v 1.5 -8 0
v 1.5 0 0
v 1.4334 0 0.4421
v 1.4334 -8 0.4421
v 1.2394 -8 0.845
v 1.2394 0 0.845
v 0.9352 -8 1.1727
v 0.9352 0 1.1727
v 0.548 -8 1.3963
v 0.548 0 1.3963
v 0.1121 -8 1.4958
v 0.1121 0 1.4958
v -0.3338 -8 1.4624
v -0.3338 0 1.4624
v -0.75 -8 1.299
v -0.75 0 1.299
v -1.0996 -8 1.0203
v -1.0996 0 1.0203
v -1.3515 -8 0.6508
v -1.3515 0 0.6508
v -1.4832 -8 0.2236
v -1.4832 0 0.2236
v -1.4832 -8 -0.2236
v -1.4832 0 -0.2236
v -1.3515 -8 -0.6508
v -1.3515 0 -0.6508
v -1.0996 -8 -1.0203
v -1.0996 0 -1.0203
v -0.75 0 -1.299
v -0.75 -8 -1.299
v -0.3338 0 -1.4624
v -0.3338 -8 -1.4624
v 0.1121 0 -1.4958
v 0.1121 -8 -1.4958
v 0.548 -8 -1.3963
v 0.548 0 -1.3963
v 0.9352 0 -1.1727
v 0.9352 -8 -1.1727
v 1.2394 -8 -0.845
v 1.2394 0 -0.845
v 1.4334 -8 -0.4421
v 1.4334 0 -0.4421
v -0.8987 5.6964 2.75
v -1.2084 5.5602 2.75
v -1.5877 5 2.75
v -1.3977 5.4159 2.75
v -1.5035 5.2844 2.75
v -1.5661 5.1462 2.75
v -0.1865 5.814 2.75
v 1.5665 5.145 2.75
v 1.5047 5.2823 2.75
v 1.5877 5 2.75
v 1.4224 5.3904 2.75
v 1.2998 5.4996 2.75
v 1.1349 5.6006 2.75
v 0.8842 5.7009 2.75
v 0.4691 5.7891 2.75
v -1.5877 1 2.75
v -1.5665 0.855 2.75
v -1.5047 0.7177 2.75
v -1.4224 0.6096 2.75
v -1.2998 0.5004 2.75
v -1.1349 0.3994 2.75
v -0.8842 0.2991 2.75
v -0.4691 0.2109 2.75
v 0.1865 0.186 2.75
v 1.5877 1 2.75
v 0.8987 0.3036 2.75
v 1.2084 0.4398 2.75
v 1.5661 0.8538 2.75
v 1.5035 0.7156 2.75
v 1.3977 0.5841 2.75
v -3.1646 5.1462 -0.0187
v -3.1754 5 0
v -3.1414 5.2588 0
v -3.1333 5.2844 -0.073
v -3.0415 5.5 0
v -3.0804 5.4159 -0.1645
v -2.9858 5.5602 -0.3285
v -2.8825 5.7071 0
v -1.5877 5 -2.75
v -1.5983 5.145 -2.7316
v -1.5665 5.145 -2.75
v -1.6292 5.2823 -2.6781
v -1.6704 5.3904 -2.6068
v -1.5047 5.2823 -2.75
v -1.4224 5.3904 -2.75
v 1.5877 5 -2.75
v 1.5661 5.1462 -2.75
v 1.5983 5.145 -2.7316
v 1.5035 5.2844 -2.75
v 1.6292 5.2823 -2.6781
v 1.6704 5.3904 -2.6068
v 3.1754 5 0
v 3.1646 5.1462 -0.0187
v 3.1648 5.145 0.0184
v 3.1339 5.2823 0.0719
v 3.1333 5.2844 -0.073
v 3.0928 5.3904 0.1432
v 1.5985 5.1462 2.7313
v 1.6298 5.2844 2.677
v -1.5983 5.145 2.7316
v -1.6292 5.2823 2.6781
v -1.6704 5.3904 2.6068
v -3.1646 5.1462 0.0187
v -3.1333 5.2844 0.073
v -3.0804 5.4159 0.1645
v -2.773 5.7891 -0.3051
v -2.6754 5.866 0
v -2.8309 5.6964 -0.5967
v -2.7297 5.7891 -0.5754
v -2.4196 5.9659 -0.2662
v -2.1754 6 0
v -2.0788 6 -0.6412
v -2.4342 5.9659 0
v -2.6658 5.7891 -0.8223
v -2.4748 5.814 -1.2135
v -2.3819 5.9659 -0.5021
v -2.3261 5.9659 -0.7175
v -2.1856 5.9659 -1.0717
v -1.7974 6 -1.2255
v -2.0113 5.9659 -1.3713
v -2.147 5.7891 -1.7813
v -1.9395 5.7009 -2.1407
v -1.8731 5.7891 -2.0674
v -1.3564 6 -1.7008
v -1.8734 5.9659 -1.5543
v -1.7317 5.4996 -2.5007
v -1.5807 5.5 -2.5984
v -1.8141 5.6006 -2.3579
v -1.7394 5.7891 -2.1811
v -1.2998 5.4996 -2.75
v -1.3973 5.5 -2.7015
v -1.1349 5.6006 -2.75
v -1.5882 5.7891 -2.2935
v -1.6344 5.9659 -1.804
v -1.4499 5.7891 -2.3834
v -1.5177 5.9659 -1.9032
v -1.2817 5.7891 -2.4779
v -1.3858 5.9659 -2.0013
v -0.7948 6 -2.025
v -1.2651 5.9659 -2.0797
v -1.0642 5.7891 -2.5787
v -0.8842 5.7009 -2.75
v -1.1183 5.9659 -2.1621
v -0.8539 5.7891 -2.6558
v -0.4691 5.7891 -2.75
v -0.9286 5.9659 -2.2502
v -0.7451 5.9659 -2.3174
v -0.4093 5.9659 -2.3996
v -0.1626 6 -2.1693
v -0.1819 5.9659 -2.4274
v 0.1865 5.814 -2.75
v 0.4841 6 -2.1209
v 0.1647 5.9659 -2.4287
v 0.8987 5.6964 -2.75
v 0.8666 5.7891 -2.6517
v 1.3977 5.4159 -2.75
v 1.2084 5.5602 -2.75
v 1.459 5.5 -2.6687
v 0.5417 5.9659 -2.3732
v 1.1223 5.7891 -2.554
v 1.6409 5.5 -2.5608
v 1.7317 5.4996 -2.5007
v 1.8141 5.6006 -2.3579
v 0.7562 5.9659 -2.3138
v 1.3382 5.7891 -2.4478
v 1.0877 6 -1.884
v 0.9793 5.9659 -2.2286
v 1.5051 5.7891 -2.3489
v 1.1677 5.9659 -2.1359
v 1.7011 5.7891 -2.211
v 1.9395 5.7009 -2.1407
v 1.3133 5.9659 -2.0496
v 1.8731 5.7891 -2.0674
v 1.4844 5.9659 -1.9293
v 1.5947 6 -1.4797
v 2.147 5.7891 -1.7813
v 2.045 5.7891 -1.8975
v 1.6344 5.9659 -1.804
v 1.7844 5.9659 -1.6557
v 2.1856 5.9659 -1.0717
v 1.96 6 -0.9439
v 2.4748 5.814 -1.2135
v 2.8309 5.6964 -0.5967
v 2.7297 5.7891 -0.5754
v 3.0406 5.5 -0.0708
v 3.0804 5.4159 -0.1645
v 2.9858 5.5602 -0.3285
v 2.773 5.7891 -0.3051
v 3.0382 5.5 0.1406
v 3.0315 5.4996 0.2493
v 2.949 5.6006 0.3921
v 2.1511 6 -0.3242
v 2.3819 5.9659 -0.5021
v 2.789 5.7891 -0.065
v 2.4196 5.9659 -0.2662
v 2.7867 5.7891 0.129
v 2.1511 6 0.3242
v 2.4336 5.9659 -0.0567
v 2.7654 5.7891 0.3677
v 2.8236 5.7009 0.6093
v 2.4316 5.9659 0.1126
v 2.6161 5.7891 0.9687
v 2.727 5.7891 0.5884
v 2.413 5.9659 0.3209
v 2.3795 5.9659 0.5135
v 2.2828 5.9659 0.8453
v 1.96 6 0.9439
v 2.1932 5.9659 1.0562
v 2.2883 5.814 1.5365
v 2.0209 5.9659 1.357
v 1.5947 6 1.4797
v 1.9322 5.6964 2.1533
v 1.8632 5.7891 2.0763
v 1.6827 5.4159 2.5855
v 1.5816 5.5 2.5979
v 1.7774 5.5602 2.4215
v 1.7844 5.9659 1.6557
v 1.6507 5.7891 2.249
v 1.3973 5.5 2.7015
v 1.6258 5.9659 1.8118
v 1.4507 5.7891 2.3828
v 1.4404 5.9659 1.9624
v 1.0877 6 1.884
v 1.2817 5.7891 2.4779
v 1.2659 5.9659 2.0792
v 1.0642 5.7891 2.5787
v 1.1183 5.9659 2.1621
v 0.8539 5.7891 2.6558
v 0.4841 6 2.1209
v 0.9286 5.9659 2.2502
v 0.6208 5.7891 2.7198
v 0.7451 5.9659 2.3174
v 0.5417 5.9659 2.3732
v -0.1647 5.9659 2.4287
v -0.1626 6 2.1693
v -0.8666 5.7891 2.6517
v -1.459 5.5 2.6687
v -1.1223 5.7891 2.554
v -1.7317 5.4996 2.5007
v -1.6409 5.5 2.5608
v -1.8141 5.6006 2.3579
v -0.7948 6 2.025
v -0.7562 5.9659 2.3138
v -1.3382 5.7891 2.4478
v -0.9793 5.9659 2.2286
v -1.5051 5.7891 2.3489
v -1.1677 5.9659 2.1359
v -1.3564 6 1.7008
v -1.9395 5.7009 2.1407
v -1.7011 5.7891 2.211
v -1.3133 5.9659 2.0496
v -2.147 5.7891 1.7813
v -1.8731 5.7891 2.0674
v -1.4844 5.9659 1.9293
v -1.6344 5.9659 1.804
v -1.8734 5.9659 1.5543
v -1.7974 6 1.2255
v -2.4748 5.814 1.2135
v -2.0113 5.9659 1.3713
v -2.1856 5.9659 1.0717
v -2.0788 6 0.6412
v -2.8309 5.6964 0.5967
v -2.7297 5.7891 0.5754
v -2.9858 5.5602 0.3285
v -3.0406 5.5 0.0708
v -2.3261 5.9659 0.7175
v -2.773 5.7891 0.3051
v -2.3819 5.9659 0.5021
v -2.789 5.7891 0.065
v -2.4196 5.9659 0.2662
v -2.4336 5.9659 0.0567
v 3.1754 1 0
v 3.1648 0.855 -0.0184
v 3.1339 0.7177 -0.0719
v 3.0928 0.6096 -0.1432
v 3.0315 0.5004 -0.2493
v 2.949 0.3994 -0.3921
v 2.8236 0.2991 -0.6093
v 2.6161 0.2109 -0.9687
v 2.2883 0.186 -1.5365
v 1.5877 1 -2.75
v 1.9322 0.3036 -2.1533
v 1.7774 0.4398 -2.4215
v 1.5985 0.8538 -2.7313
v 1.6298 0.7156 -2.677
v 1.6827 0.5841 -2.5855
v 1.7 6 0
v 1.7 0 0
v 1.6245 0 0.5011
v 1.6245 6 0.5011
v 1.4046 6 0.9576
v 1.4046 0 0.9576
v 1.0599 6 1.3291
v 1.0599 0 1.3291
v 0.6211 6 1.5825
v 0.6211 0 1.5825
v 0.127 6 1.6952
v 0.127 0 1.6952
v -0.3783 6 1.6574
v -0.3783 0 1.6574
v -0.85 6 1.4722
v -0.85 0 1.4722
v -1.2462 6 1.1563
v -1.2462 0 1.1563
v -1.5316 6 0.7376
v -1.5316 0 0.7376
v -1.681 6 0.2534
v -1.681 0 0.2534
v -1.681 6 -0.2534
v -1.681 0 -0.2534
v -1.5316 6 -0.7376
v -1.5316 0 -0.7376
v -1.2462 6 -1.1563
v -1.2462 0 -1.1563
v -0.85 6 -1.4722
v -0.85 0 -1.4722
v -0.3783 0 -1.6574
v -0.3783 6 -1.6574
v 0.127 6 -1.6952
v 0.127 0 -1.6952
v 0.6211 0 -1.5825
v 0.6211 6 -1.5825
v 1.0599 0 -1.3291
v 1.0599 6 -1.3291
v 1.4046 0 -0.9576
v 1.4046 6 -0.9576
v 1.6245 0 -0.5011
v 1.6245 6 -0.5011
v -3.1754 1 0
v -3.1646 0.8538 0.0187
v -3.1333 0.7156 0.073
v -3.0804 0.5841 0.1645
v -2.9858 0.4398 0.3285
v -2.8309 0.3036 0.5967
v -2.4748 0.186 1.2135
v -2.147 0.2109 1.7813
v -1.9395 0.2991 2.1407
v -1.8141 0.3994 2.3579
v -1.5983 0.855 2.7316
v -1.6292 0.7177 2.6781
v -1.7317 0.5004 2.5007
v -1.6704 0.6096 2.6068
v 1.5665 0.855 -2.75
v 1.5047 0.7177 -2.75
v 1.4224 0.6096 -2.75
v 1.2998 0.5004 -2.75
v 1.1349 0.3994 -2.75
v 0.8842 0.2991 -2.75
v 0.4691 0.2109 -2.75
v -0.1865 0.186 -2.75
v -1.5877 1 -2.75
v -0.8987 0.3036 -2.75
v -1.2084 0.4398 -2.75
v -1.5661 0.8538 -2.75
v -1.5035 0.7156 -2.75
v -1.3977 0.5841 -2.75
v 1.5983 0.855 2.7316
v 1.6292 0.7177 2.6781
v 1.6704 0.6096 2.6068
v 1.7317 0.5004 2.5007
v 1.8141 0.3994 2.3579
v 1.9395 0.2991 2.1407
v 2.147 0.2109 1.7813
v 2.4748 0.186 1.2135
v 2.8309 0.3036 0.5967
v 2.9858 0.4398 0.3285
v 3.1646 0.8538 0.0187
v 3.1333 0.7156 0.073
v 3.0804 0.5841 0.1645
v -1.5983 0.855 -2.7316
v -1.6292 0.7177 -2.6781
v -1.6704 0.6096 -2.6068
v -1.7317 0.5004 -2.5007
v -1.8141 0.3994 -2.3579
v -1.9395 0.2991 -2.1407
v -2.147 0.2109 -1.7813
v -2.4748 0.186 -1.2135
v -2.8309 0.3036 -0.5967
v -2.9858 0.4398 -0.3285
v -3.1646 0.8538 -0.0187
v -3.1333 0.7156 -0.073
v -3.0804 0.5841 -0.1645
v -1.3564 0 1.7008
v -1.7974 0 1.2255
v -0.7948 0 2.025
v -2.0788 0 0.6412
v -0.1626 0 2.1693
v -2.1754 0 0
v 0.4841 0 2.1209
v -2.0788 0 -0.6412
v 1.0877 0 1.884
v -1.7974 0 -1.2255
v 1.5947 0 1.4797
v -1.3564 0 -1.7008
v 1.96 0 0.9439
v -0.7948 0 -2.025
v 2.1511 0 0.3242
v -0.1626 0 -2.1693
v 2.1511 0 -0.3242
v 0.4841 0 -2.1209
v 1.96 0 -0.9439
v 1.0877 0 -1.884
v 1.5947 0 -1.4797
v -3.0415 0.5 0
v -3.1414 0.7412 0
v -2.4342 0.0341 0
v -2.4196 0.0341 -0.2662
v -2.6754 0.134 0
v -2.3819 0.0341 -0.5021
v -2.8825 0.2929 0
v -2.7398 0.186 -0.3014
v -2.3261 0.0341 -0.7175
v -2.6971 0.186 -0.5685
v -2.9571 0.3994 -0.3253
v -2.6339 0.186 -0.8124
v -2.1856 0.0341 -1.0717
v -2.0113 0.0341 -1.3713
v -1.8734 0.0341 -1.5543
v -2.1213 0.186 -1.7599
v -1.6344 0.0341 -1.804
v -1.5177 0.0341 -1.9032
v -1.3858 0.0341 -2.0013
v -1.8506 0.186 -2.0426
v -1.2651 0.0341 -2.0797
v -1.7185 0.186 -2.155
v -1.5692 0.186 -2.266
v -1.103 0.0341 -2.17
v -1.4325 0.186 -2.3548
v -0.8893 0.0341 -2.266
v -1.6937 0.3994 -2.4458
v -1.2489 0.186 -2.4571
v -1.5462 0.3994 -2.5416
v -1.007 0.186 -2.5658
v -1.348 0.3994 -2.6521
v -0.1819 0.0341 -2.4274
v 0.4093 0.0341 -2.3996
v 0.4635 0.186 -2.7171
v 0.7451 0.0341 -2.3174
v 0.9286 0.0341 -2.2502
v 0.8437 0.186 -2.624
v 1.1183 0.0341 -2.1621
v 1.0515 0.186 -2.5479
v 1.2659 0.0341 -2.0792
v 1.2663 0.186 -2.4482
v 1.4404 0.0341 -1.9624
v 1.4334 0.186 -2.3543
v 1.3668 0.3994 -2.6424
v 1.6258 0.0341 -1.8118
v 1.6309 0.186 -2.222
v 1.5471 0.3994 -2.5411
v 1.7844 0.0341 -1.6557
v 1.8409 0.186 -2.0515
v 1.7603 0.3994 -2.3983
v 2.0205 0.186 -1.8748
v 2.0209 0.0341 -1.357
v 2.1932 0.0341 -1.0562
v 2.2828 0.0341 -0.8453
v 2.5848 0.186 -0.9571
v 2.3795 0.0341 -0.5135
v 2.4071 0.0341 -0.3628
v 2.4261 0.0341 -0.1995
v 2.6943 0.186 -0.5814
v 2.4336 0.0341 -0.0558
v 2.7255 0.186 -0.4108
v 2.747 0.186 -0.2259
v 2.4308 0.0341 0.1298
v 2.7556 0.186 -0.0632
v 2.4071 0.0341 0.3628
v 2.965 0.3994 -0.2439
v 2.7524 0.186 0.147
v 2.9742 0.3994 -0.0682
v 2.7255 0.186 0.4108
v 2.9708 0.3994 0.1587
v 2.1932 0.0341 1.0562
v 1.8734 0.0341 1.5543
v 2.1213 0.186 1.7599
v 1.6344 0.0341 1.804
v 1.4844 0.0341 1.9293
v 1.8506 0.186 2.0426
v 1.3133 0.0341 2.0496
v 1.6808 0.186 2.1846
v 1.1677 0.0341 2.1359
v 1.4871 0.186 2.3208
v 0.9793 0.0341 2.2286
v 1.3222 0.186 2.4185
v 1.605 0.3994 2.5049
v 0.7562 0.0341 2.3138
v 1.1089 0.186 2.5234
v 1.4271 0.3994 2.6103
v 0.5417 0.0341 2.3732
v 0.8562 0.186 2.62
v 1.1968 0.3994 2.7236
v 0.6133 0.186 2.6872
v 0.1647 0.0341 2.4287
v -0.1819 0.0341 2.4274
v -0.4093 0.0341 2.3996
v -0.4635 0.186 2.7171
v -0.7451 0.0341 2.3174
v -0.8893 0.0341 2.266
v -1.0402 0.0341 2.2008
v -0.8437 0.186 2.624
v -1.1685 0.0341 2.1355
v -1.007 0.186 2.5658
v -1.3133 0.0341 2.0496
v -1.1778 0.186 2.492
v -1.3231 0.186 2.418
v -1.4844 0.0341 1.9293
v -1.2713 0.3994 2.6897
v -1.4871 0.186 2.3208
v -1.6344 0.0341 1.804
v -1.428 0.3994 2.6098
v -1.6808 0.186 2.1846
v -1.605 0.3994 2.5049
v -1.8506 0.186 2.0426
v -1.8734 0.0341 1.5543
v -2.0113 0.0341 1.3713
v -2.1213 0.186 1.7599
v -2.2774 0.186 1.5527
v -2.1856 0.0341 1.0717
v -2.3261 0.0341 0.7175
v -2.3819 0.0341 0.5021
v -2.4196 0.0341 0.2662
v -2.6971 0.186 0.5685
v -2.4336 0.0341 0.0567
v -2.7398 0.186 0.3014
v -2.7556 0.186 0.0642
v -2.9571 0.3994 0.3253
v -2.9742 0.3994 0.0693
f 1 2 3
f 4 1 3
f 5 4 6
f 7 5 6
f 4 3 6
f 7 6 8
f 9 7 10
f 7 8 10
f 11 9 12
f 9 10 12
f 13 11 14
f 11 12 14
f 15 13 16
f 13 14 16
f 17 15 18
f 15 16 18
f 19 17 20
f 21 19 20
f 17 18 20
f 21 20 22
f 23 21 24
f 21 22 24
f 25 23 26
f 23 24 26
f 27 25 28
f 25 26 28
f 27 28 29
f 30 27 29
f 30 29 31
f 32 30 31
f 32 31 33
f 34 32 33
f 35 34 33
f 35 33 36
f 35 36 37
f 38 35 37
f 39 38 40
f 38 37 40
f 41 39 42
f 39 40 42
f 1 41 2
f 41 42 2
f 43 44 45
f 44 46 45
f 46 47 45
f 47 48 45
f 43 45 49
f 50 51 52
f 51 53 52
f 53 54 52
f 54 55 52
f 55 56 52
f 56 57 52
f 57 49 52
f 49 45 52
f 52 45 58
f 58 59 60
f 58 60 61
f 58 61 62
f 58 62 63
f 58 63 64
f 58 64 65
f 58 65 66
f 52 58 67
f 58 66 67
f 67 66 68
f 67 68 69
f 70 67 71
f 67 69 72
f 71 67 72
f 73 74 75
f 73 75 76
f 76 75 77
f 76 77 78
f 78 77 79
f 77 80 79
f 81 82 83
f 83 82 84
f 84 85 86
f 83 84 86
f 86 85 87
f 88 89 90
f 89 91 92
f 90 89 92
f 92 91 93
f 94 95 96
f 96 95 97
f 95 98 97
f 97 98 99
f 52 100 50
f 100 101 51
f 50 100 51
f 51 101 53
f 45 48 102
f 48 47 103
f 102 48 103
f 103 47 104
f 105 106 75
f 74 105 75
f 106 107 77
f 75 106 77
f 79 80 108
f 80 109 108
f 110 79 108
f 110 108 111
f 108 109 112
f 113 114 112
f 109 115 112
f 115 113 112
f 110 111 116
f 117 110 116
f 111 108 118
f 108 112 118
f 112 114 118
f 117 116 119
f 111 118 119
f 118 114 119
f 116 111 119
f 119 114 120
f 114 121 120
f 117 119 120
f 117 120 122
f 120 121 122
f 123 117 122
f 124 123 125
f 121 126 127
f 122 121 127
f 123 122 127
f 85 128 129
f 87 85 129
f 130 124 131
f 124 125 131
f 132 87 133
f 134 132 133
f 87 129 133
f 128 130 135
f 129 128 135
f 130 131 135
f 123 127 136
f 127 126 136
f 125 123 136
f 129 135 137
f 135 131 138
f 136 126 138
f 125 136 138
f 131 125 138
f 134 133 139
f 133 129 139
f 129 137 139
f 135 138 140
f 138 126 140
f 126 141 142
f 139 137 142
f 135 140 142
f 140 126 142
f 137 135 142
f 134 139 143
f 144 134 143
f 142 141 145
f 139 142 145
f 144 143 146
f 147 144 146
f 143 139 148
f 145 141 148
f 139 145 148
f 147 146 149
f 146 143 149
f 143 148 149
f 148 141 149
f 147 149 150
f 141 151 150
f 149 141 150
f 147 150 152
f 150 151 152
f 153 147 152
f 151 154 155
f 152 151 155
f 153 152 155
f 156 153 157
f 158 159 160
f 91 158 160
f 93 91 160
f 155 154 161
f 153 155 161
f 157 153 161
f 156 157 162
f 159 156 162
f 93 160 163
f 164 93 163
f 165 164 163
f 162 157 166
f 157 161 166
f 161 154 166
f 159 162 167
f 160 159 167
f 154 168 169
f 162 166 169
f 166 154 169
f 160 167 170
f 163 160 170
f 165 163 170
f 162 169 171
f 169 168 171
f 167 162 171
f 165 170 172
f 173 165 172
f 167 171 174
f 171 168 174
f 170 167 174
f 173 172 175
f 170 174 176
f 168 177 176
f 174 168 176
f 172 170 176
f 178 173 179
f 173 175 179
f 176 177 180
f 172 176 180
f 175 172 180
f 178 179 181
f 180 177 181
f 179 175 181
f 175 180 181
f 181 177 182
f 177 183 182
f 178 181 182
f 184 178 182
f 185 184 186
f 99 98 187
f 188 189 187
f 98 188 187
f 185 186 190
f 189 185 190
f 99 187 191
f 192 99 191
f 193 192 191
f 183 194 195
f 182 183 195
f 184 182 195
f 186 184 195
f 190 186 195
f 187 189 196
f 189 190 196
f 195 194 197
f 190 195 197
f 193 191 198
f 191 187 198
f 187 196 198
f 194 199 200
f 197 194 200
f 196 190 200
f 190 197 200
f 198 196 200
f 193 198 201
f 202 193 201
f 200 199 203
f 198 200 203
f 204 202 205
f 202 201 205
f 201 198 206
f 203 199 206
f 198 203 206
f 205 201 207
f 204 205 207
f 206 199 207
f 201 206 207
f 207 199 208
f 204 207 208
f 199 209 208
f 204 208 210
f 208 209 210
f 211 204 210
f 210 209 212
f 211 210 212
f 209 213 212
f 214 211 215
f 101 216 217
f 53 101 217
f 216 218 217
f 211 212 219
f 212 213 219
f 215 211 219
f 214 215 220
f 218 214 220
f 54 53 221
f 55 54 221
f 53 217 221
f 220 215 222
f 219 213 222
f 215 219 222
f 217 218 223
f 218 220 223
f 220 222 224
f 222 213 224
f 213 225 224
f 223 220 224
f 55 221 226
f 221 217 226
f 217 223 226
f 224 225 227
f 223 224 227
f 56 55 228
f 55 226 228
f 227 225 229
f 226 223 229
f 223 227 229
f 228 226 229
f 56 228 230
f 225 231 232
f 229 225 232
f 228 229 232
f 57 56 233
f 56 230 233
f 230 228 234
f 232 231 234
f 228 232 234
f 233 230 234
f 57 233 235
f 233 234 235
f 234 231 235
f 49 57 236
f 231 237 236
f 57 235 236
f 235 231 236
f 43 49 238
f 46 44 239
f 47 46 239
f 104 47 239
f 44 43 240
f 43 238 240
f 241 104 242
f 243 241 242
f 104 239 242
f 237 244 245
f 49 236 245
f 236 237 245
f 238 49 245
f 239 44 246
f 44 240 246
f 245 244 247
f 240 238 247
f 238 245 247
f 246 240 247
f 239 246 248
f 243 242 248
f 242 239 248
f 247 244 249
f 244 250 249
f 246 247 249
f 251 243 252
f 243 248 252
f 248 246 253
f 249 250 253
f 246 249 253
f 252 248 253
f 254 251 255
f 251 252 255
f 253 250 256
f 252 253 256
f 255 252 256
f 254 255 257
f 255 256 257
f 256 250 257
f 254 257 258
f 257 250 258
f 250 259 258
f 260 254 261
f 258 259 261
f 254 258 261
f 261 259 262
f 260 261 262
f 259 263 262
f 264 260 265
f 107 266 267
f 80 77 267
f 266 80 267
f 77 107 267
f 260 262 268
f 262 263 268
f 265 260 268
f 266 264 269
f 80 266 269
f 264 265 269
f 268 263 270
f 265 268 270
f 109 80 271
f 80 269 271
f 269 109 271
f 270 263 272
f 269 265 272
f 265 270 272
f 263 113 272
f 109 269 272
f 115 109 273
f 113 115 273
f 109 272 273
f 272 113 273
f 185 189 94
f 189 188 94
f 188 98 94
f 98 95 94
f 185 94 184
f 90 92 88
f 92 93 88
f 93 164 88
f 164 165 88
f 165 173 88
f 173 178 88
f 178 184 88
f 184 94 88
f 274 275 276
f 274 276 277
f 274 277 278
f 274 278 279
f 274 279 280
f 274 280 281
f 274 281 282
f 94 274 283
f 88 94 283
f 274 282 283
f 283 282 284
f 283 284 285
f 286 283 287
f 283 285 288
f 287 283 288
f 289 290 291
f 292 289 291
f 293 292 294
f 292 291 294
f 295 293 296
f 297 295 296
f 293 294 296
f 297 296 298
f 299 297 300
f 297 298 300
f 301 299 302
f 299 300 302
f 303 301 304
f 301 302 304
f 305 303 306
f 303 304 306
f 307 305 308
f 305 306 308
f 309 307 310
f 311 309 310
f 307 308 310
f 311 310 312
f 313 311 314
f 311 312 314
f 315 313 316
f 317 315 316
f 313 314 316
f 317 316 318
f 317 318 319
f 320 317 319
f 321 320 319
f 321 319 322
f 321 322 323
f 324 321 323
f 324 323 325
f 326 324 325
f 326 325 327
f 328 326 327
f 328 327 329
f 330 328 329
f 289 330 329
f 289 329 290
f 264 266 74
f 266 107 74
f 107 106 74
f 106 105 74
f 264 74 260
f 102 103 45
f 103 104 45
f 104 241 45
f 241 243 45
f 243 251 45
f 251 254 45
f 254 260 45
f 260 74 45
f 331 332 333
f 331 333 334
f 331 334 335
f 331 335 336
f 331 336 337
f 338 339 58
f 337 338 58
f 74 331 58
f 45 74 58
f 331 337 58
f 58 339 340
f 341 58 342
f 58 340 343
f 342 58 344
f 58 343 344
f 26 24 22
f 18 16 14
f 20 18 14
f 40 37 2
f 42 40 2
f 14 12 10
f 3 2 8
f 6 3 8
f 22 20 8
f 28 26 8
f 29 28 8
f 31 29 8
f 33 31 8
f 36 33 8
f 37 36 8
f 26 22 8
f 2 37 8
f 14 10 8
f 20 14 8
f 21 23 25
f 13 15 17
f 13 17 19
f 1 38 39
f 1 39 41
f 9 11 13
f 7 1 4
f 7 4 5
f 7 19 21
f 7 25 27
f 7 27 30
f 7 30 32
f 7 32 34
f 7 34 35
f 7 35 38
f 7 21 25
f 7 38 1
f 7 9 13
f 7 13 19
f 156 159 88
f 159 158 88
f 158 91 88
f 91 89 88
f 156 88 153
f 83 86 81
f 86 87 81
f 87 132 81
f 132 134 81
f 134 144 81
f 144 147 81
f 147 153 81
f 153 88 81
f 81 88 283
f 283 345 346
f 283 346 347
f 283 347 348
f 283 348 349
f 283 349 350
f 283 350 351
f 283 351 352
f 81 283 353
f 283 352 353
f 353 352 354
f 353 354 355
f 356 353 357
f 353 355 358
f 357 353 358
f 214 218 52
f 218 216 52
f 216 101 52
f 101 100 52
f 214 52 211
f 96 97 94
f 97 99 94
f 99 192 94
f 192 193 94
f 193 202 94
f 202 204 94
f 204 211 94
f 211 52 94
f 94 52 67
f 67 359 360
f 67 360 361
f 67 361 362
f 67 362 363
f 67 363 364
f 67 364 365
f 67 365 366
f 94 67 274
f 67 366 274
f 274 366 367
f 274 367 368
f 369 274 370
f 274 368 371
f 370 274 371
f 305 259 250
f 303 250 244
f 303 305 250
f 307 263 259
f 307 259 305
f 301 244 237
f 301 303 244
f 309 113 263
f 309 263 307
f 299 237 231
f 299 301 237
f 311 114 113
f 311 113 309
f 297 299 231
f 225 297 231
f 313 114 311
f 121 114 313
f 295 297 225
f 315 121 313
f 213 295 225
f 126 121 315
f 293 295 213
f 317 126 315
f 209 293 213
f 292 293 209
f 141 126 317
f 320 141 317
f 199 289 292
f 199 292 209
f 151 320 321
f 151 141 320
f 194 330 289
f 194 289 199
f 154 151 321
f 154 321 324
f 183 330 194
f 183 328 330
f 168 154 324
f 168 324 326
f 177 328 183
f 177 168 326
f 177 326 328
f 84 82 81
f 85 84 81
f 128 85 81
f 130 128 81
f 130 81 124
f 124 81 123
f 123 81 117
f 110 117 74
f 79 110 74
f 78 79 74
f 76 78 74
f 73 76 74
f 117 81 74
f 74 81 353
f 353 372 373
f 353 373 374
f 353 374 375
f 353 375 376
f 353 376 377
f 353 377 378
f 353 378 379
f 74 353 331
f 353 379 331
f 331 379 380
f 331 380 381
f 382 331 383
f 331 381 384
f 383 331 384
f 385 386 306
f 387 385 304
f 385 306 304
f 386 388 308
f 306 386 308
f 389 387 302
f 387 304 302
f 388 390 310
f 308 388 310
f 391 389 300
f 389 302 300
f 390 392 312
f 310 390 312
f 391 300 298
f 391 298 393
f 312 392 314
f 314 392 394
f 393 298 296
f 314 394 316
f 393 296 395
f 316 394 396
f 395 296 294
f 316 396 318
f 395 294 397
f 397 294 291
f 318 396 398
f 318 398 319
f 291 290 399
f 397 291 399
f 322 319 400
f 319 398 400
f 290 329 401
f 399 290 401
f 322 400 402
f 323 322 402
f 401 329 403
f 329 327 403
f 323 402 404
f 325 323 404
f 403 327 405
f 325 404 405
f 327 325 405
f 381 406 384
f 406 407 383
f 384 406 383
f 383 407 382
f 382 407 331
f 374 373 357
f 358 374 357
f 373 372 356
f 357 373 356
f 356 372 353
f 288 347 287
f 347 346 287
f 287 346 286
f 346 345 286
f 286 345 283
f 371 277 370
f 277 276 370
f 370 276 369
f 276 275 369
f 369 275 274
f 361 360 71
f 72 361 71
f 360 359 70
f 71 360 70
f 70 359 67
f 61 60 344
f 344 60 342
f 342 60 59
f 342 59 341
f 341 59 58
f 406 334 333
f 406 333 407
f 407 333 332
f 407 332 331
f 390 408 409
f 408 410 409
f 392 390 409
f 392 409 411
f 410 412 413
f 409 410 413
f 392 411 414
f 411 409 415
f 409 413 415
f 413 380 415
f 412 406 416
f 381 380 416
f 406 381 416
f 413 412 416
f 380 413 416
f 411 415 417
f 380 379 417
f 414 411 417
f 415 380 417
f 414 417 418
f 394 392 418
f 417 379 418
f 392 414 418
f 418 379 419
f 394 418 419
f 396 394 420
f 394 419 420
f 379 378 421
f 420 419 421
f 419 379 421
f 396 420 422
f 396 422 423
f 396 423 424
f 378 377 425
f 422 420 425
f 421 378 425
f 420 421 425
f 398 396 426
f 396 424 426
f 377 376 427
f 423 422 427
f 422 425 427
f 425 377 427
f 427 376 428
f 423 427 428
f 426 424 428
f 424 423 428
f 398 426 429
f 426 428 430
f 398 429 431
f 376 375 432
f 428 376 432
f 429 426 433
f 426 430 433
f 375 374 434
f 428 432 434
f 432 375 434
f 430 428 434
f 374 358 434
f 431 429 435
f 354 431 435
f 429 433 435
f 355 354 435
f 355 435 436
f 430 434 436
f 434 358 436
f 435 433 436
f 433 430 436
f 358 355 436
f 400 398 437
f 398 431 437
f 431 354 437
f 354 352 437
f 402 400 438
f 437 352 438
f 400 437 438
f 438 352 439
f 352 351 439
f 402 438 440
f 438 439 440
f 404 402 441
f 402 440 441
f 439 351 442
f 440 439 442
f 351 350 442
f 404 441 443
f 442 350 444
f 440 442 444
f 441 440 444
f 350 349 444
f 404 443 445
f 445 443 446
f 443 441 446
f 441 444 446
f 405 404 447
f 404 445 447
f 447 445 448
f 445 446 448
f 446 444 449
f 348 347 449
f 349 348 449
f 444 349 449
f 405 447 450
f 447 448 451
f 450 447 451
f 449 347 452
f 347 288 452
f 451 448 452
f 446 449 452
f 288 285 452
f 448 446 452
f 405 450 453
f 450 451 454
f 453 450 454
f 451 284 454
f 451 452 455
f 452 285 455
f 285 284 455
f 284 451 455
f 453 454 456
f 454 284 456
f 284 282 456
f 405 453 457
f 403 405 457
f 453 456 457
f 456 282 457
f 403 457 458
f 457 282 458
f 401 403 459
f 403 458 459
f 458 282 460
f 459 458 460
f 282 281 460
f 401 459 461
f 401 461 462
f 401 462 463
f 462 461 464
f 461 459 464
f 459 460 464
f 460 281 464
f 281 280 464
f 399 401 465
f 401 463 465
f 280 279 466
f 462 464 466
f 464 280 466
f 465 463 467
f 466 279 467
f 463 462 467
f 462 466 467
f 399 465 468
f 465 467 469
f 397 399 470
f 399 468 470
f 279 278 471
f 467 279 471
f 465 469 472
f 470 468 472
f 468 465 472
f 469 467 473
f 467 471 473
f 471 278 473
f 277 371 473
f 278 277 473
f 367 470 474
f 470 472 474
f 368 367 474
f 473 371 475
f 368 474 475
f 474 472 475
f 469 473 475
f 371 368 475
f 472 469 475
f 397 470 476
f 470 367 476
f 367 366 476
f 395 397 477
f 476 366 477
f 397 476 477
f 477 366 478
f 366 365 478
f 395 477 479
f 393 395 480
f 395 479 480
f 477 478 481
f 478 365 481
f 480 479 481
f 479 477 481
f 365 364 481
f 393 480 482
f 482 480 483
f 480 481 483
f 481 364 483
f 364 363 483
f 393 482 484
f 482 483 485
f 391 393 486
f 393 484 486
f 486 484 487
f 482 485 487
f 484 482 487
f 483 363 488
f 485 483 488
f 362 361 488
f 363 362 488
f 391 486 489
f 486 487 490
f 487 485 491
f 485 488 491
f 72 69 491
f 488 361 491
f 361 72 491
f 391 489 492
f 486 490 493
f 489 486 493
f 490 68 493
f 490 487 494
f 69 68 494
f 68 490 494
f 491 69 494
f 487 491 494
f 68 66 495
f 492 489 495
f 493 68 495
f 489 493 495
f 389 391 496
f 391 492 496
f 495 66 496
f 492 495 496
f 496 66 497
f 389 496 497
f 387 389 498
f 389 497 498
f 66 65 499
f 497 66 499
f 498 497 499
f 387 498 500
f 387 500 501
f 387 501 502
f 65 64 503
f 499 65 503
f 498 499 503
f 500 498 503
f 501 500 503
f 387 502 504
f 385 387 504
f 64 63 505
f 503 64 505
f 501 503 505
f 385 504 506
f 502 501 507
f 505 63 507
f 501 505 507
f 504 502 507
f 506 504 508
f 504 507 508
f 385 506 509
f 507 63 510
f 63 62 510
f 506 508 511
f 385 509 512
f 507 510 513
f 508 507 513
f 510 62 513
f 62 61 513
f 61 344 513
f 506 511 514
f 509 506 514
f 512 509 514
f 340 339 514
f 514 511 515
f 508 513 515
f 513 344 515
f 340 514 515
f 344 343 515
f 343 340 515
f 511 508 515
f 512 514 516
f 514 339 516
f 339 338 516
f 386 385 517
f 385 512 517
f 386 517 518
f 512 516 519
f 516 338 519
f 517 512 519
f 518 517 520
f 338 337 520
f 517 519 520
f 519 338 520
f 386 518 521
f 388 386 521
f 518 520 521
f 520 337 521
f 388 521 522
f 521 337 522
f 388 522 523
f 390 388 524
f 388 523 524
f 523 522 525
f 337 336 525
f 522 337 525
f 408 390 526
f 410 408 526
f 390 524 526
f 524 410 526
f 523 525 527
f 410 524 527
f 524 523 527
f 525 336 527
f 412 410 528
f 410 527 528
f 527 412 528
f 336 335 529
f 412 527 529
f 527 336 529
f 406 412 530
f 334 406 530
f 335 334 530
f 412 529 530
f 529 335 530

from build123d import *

# Parameters (mm, degrees)
BOSS_EXTRUDE1_DEPTH      = 6
M3_CLEARANCE_HOLE1_D     = 3.4
M3_CLEARANCE_HOLE1_DEPTH = 12
M3_CLEARANCE_HOLE1_TIP   = 1.021463052
SKETCH5_R                = 1.5
BOSS_EXTRUDE2_DEPTH      = 8


with BuildPart() as part:
    # Sketch1 → Boss-Extrude1 (new body)
    with BuildSketch(Plane(origin=(0, 0, 0), x_dir=(1, 0, 0), z_dir=(0, 1, 0))):
        Polygon((3.175426481, 0), (1.58771324, 2.75), (-1.58771324, 2.75), (-3.175426481, 0), (-1.58771324, -2.75), (1.58771324, -2.75), align=None)
    extrude(amount=BOSS_EXTRUDE1_DEPTH)

    # M3 Clearance Hole1
    with Locations(Plane(origin=(0, 6, 0), x_dir=(-1, 0, 0), z_dir=(0, 1, 0))):
        with Locations((0, 0)):
            Hole(M3_CLEARANCE_HOLE1_D / 2, depth=M3_CLEARANCE_HOLE1_DEPTH)
            with Locations((0, 0, -(M3_CLEARANCE_HOLE1_DEPTH + M3_CLEARANCE_HOLE1_TIP / 2))):  # 118° drill point
                Cone(0, M3_CLEARANCE_HOLE1_D / 2, M3_CLEARANCE_HOLE1_TIP, mode=Mode.SUBTRACT)

    # Sketch4 → Cut-Revolve1 (revolve, cut)
    with BuildSketch(Plane.XY):
        with BuildLine():
            Line((-2.175426481, 6), (-3.175426481, 6))
            Line((-3.175426481, 6), (-3.175426481, 5))
            ThreePointArc((-3.175426481, 5), (-2.882533262, 5.707106781), (-2.175426481, 6))
        make_face()
        with BuildLine():
            Line((-3.175426481, 1), (-3.175426481, 0))
            Line((-3.175426481, 0), (-2.175426481, 0))
            ThreePointArc((-2.175426481, 0), (-2.882533262, 0.292893219), (-3.175426481, 1))
        make_face()
    revolve(axis=Axis((0, 6, 0), (0, -1, 0)), mode=Mode.SUBTRACT)


with BuildPart() as body_2:
    # Sketch5 → Boss-Extrude2 (new body)
    with BuildSketch(Plane.XZ):
        Circle(SKETCH5_R)
    extrude(amount=BOSS_EXTRUDE2_DEPTH)


solid = Compound([part.part, body_2.part])
